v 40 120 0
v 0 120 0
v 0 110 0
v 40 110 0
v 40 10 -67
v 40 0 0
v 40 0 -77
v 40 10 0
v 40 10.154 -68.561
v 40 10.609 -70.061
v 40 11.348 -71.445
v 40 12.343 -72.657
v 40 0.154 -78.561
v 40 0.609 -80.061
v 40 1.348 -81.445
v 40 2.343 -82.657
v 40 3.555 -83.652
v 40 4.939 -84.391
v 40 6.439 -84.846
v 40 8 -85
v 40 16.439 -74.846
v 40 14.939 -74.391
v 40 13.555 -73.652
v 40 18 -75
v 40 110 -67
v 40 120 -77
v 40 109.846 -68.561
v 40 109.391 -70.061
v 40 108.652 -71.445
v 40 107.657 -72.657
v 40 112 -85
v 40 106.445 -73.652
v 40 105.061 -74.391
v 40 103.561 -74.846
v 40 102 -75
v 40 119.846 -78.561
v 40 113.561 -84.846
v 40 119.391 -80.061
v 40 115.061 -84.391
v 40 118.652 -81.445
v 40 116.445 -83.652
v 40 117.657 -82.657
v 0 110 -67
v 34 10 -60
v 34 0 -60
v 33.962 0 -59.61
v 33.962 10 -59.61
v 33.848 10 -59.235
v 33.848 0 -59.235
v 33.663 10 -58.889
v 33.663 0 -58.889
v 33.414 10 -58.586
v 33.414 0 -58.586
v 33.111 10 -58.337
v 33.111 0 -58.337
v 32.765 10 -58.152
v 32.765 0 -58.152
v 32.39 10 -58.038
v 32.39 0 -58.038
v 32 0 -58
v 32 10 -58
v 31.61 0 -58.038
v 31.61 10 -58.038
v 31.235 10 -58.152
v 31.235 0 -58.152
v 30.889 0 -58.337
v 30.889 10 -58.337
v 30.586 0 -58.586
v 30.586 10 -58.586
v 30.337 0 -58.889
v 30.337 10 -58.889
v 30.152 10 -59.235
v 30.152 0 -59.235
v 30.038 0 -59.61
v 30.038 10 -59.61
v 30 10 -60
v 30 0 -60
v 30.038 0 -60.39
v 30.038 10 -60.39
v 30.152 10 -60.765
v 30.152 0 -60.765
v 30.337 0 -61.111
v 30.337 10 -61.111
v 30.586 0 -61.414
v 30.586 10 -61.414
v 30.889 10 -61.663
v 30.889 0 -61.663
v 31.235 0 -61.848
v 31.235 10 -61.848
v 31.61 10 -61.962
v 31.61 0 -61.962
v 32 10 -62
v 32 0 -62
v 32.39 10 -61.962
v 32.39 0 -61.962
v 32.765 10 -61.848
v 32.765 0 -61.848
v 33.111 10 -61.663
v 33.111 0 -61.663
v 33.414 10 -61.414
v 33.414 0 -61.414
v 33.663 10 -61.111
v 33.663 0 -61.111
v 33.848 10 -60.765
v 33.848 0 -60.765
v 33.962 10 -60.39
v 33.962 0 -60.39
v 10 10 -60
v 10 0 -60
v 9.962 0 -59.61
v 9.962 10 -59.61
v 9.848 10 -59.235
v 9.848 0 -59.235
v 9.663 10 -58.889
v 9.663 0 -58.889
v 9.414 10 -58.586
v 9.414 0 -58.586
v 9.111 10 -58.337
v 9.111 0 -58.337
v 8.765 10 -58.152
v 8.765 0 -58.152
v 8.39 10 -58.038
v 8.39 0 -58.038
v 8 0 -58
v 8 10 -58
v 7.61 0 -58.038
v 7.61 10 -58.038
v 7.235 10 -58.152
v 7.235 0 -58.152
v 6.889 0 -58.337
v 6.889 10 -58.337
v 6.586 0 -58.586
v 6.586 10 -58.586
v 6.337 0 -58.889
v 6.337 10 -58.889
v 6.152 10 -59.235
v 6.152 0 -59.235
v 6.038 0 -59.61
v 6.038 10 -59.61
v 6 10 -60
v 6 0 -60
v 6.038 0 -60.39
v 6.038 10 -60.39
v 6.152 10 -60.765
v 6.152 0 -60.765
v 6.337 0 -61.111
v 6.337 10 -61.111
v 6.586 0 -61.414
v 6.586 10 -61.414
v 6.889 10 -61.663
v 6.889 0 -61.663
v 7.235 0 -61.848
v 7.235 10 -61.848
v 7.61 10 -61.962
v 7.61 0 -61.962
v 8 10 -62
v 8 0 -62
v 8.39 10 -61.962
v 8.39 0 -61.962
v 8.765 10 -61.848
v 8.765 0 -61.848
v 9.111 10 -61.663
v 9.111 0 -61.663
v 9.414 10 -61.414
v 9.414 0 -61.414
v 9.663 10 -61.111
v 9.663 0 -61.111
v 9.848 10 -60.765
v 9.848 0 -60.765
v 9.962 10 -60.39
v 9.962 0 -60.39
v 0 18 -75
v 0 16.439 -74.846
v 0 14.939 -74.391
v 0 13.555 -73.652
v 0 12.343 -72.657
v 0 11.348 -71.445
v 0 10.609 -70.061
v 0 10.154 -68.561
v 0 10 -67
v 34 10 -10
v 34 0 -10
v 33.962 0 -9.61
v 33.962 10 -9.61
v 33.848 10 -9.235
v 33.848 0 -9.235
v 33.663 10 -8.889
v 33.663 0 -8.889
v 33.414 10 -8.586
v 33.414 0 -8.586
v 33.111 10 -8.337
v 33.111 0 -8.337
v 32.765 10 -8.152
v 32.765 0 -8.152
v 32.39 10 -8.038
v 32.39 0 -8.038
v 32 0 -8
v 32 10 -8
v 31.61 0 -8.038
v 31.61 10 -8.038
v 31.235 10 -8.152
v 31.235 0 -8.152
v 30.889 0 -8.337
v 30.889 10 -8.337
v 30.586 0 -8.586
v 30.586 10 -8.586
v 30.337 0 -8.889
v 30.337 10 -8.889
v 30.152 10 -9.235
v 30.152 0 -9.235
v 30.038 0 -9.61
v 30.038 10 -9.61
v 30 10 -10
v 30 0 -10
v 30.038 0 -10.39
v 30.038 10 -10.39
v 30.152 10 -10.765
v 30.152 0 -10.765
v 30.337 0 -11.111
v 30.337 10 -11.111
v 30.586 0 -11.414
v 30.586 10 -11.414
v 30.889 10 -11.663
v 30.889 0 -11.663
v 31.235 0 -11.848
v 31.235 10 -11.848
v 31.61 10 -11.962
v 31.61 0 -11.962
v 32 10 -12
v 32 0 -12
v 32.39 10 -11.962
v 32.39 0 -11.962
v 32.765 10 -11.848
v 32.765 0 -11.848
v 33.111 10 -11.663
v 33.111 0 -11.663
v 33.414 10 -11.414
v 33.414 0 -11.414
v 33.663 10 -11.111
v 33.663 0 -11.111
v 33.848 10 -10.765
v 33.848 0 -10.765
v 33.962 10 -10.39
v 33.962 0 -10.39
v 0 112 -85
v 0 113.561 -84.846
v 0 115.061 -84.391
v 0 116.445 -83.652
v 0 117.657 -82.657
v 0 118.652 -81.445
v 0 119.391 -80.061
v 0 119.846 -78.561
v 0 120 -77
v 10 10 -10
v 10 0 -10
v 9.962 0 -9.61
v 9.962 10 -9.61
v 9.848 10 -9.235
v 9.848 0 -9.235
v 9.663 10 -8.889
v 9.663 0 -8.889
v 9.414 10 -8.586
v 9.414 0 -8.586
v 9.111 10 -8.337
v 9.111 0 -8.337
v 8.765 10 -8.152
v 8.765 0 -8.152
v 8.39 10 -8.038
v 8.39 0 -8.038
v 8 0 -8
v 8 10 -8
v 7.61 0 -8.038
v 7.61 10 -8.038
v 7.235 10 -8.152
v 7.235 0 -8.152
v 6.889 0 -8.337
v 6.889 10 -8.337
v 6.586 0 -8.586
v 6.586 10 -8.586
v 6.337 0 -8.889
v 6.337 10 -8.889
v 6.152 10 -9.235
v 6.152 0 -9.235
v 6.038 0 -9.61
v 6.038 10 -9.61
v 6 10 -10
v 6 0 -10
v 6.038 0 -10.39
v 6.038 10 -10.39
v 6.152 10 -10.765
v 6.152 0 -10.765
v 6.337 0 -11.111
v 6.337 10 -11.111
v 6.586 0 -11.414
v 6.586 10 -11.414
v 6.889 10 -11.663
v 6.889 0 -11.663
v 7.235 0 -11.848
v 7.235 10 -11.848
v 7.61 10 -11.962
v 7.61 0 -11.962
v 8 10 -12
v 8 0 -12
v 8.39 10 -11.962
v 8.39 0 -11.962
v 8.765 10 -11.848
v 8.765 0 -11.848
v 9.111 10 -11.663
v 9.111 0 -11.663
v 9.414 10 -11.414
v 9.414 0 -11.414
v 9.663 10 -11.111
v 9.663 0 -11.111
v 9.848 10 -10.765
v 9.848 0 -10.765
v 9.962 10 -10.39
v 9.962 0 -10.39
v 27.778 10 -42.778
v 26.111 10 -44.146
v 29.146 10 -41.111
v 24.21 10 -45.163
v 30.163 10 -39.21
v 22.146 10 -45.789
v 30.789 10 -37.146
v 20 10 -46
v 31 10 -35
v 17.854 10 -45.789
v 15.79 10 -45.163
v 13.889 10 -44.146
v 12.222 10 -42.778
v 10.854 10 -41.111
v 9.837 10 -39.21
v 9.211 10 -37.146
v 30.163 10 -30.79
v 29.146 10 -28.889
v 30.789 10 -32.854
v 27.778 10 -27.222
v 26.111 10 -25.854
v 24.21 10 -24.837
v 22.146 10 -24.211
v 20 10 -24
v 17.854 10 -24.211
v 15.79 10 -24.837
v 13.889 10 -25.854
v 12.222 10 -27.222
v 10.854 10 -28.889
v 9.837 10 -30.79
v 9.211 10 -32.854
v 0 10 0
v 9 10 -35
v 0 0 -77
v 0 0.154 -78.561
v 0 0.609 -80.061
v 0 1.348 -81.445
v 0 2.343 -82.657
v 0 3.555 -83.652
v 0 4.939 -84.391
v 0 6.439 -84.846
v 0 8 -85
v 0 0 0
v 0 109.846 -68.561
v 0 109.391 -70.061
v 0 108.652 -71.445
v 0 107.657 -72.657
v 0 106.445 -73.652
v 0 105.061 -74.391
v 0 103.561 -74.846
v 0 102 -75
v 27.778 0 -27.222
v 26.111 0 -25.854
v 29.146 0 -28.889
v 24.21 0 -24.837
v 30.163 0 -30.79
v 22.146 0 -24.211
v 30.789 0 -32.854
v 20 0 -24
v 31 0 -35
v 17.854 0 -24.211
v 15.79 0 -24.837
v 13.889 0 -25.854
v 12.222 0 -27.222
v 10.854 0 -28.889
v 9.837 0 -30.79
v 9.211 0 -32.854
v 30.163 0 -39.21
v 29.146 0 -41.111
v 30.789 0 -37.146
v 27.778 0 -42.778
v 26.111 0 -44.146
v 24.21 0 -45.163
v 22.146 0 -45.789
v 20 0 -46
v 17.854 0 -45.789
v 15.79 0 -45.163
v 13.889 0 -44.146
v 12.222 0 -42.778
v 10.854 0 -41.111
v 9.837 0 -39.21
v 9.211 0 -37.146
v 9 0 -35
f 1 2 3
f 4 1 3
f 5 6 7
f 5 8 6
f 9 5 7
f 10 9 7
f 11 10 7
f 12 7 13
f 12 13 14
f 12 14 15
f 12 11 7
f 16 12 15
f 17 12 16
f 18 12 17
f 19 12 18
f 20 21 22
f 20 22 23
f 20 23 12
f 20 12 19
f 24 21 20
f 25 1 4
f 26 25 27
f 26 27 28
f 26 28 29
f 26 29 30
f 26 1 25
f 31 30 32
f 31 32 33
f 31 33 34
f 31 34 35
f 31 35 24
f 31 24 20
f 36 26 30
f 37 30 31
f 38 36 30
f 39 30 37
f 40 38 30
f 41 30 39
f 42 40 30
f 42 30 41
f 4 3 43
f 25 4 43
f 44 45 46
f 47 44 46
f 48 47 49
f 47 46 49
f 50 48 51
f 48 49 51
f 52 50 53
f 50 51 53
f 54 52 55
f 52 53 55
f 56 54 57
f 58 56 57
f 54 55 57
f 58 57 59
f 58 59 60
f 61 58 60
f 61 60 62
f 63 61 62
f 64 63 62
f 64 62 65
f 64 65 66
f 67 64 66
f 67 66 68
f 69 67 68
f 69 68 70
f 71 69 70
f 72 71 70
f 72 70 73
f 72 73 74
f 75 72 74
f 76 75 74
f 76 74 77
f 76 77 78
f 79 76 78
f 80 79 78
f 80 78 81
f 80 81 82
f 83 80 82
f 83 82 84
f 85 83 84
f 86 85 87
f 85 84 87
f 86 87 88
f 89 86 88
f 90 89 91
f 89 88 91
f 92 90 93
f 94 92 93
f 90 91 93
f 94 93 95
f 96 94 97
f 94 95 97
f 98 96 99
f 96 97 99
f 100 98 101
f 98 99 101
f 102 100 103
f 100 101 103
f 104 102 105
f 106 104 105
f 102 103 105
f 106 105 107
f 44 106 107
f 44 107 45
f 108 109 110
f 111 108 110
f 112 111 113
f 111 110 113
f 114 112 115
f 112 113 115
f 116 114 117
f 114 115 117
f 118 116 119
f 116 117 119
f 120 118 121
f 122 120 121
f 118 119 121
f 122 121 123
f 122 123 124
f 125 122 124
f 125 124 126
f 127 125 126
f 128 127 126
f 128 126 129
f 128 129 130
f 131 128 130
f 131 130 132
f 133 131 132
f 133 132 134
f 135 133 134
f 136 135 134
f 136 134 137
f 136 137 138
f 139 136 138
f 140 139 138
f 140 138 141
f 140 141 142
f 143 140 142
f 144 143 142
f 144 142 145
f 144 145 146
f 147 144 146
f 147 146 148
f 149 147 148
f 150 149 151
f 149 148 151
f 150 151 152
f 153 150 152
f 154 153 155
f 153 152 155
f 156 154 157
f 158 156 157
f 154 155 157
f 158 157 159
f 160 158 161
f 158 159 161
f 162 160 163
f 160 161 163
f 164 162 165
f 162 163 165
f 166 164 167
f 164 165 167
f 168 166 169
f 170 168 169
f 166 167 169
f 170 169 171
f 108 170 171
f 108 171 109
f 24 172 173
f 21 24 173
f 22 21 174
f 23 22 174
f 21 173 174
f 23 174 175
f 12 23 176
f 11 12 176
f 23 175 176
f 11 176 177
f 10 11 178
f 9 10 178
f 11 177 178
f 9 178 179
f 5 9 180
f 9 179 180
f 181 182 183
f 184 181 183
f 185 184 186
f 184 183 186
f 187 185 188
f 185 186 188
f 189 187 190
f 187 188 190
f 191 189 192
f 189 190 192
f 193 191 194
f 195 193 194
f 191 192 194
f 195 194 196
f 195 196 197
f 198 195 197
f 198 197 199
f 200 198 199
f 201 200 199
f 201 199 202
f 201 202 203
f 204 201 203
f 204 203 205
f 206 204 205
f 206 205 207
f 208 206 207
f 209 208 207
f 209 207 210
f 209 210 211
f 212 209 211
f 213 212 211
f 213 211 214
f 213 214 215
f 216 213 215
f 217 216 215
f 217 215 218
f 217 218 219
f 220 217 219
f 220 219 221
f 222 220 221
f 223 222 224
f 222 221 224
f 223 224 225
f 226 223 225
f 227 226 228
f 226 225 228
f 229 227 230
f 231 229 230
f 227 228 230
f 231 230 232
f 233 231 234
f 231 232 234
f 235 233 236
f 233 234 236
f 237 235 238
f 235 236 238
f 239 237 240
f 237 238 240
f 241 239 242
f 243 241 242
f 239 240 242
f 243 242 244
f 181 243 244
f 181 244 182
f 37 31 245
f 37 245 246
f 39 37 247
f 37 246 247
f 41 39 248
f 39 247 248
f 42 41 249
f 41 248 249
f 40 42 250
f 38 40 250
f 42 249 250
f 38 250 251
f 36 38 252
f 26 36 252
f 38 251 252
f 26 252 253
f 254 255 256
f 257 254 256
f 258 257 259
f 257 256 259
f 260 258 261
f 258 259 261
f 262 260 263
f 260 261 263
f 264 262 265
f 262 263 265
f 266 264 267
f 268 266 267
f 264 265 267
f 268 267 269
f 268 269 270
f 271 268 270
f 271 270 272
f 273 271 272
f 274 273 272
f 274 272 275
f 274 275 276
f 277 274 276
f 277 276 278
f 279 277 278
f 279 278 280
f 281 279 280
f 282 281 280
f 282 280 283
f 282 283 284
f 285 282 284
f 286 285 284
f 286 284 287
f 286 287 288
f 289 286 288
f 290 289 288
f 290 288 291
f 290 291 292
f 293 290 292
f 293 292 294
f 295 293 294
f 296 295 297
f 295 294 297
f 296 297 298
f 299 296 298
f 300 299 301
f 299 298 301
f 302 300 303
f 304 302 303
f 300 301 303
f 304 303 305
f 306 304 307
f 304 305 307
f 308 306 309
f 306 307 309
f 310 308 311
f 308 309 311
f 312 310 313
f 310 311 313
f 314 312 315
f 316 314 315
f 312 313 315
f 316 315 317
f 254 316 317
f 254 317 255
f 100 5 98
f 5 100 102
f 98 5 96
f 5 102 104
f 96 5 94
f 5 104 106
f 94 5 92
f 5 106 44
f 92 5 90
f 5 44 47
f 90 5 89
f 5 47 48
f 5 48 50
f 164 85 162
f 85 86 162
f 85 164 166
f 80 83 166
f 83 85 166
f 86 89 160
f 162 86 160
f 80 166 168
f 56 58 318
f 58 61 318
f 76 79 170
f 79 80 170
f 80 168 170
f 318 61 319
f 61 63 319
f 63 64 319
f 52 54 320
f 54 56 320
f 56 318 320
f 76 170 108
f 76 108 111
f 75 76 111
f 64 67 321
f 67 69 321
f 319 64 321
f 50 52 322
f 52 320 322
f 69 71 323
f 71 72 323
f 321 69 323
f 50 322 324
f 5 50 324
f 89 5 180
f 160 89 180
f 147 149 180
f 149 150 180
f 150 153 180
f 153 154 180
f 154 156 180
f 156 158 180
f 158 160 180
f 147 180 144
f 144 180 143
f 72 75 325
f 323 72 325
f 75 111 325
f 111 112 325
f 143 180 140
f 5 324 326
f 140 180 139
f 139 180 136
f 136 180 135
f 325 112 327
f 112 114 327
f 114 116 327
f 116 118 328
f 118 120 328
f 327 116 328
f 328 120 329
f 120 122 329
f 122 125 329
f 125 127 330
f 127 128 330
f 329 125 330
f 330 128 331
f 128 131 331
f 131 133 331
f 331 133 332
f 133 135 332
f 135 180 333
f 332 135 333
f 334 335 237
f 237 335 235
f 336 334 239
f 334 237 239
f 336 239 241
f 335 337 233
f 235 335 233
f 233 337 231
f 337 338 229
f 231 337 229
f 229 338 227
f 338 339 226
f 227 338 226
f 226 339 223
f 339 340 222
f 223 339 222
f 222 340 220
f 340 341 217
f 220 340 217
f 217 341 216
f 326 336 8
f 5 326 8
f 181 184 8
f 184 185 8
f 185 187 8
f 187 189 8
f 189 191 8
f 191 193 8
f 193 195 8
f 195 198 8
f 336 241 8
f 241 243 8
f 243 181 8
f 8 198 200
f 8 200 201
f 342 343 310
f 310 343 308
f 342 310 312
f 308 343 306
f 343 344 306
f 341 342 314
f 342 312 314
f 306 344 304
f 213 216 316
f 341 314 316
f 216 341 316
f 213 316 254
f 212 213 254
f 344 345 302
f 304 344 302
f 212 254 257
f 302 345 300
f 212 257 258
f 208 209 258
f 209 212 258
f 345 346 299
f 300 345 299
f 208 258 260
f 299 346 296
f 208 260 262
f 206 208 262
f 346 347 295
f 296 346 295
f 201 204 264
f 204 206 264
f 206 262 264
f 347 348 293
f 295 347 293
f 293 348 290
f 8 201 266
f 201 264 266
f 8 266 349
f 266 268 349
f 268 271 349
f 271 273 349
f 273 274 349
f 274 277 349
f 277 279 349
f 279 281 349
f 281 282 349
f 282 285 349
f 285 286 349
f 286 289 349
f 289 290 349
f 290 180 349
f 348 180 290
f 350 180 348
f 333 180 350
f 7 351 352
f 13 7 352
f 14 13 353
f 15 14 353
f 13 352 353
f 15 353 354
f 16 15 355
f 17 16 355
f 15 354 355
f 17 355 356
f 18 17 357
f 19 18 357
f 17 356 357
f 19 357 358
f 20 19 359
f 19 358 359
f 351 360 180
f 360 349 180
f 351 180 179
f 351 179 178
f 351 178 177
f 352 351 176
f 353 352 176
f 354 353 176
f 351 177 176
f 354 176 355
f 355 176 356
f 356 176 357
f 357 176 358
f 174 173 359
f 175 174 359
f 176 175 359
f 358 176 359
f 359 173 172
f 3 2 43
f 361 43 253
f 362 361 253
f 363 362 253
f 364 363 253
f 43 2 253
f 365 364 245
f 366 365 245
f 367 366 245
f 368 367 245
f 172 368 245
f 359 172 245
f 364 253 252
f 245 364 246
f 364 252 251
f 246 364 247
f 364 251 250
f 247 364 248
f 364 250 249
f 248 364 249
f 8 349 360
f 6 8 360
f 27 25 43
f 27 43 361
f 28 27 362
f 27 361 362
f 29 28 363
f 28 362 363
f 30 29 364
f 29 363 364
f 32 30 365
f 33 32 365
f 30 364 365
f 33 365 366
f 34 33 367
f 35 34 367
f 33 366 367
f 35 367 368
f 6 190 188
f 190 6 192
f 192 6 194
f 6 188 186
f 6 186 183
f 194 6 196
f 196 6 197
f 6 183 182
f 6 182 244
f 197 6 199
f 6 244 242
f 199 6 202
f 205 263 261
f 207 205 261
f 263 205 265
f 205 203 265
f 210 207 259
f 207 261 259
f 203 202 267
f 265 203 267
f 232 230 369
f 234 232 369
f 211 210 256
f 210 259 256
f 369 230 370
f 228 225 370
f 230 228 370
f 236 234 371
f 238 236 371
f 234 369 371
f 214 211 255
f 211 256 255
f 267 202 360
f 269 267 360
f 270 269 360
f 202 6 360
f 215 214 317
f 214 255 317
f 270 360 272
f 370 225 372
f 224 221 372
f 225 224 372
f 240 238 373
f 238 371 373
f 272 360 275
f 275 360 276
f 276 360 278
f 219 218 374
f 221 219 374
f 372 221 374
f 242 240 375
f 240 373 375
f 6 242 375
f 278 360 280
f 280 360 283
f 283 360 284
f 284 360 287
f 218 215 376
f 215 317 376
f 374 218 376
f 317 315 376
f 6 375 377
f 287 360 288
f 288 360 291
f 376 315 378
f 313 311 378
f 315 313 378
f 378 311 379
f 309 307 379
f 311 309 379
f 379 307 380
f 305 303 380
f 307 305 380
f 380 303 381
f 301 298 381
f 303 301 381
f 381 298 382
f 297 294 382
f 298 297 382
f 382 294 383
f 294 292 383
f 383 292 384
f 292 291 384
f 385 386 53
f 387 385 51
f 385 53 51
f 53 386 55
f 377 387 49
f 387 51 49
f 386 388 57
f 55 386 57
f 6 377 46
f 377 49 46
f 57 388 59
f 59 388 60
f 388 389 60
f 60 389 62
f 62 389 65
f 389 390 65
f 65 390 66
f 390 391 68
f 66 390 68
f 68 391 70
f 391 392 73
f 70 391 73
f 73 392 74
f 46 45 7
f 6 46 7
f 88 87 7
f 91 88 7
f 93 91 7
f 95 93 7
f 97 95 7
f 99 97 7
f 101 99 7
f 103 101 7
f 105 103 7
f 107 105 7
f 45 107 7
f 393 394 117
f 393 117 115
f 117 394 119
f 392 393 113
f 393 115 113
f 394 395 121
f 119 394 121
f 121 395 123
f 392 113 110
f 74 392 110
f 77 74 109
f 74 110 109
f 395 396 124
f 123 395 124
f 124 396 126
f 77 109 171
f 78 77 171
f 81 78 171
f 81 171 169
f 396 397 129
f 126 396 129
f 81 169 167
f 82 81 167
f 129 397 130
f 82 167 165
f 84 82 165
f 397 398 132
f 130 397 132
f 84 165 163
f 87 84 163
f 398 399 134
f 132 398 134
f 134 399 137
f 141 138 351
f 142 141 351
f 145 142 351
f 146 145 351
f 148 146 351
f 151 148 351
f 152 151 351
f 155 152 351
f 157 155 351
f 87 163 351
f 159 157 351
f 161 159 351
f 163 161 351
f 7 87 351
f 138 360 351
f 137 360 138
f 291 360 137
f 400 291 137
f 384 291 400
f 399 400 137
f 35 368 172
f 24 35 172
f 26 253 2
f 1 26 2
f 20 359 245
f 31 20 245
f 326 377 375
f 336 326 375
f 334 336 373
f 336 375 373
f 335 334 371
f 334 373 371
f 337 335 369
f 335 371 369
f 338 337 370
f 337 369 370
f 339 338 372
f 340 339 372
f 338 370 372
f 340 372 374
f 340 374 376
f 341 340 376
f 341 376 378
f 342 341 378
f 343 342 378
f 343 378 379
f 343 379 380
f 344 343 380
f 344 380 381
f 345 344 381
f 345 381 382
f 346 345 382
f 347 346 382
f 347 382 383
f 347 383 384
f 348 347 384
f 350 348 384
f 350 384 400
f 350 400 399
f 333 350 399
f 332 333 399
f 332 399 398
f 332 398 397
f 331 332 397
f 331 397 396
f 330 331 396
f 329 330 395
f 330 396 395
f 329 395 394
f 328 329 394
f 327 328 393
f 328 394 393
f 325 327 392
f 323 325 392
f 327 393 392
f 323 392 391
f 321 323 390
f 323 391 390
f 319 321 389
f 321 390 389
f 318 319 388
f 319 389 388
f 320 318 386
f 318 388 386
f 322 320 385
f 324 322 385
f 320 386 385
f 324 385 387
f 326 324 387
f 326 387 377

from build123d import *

# Parameters (mm, degrees)
EXTRUDE_1_DEPTH     = 40
CUT_EXTRUDE_1_REACH = 122
SKETCH_5_R          = 11
SKETCH_6_R          = 2
CUT_EXTRUDE_2_DEPTH = 20


with BuildPart() as part:
    # 草图1 → 凸台-拉伸1 (new body)
    with BuildSketch(Plane(origin=(0, 0, 0), x_dir=(0, 0, -1), z_dir=(1, 0, 0))):
        with BuildLine():
            Line((0, 0), (77, 0))
            ThreePointArc((77, 0), (82.656854249, 2.343145751), (85, 8))
            Line((85, 8), (85, 112))
            ThreePointArc((85, 112), (82.656854249, 117.656854249), (77, 120))
            Line((77, 120), (0, 120))
            Line((0, 120), (0, 110))
            Line((0, 110), (67, 110))
            ThreePointArc((67, 110), (72.656854249, 107.656854249), (75, 102))
            Line((75, 102), (75, 18))
            ThreePointArc((75, 18), (72.656854249, 12.343145751), (67, 10))
            Line((67, 10), (0, 10))
            Line((0, 10), (0, 0))
        make_face()
    extrude(amount=EXTRUDE_1_DEPTH)

    # 草图5 → 切除-拉伸1 (cut, up to next)
    with BuildSketch(Plane.XZ, mode=Mode.PRIVATE) as cut_extrude_1_sk1:
        with Locations((20, -35)):
            Circle(SKETCH_5_R)
    cut_extrude_1_tool1 = extrude(cut_extrude_1_sk1.sketch, amount=-CUT_EXTRUDE_1_REACH, mode=Mode.PRIVATE) & part.part
    add(cut_extrude_1_tool1.solids().sort_by_distance((20, 0, -35))[0], mode=Mode.SUBTRACT)

    # 草图6 → 切除-拉伸2 (cut)
    with BuildSketch(Plane.XZ):
        with Locations((8, -10)):
            Circle(SKETCH_6_R)
        with Locations((32, -10)):
            Circle(SKETCH_6_R)
        with Locations((8, -60)):
            Circle(SKETCH_6_R)
        with Locations((32, -60)):
            Circle(SKETCH_6_R)
    extrude(amount=-CUT_EXTRUDE_2_DEPTH, mode=Mode.SUBTRACT)


solid = part.part
